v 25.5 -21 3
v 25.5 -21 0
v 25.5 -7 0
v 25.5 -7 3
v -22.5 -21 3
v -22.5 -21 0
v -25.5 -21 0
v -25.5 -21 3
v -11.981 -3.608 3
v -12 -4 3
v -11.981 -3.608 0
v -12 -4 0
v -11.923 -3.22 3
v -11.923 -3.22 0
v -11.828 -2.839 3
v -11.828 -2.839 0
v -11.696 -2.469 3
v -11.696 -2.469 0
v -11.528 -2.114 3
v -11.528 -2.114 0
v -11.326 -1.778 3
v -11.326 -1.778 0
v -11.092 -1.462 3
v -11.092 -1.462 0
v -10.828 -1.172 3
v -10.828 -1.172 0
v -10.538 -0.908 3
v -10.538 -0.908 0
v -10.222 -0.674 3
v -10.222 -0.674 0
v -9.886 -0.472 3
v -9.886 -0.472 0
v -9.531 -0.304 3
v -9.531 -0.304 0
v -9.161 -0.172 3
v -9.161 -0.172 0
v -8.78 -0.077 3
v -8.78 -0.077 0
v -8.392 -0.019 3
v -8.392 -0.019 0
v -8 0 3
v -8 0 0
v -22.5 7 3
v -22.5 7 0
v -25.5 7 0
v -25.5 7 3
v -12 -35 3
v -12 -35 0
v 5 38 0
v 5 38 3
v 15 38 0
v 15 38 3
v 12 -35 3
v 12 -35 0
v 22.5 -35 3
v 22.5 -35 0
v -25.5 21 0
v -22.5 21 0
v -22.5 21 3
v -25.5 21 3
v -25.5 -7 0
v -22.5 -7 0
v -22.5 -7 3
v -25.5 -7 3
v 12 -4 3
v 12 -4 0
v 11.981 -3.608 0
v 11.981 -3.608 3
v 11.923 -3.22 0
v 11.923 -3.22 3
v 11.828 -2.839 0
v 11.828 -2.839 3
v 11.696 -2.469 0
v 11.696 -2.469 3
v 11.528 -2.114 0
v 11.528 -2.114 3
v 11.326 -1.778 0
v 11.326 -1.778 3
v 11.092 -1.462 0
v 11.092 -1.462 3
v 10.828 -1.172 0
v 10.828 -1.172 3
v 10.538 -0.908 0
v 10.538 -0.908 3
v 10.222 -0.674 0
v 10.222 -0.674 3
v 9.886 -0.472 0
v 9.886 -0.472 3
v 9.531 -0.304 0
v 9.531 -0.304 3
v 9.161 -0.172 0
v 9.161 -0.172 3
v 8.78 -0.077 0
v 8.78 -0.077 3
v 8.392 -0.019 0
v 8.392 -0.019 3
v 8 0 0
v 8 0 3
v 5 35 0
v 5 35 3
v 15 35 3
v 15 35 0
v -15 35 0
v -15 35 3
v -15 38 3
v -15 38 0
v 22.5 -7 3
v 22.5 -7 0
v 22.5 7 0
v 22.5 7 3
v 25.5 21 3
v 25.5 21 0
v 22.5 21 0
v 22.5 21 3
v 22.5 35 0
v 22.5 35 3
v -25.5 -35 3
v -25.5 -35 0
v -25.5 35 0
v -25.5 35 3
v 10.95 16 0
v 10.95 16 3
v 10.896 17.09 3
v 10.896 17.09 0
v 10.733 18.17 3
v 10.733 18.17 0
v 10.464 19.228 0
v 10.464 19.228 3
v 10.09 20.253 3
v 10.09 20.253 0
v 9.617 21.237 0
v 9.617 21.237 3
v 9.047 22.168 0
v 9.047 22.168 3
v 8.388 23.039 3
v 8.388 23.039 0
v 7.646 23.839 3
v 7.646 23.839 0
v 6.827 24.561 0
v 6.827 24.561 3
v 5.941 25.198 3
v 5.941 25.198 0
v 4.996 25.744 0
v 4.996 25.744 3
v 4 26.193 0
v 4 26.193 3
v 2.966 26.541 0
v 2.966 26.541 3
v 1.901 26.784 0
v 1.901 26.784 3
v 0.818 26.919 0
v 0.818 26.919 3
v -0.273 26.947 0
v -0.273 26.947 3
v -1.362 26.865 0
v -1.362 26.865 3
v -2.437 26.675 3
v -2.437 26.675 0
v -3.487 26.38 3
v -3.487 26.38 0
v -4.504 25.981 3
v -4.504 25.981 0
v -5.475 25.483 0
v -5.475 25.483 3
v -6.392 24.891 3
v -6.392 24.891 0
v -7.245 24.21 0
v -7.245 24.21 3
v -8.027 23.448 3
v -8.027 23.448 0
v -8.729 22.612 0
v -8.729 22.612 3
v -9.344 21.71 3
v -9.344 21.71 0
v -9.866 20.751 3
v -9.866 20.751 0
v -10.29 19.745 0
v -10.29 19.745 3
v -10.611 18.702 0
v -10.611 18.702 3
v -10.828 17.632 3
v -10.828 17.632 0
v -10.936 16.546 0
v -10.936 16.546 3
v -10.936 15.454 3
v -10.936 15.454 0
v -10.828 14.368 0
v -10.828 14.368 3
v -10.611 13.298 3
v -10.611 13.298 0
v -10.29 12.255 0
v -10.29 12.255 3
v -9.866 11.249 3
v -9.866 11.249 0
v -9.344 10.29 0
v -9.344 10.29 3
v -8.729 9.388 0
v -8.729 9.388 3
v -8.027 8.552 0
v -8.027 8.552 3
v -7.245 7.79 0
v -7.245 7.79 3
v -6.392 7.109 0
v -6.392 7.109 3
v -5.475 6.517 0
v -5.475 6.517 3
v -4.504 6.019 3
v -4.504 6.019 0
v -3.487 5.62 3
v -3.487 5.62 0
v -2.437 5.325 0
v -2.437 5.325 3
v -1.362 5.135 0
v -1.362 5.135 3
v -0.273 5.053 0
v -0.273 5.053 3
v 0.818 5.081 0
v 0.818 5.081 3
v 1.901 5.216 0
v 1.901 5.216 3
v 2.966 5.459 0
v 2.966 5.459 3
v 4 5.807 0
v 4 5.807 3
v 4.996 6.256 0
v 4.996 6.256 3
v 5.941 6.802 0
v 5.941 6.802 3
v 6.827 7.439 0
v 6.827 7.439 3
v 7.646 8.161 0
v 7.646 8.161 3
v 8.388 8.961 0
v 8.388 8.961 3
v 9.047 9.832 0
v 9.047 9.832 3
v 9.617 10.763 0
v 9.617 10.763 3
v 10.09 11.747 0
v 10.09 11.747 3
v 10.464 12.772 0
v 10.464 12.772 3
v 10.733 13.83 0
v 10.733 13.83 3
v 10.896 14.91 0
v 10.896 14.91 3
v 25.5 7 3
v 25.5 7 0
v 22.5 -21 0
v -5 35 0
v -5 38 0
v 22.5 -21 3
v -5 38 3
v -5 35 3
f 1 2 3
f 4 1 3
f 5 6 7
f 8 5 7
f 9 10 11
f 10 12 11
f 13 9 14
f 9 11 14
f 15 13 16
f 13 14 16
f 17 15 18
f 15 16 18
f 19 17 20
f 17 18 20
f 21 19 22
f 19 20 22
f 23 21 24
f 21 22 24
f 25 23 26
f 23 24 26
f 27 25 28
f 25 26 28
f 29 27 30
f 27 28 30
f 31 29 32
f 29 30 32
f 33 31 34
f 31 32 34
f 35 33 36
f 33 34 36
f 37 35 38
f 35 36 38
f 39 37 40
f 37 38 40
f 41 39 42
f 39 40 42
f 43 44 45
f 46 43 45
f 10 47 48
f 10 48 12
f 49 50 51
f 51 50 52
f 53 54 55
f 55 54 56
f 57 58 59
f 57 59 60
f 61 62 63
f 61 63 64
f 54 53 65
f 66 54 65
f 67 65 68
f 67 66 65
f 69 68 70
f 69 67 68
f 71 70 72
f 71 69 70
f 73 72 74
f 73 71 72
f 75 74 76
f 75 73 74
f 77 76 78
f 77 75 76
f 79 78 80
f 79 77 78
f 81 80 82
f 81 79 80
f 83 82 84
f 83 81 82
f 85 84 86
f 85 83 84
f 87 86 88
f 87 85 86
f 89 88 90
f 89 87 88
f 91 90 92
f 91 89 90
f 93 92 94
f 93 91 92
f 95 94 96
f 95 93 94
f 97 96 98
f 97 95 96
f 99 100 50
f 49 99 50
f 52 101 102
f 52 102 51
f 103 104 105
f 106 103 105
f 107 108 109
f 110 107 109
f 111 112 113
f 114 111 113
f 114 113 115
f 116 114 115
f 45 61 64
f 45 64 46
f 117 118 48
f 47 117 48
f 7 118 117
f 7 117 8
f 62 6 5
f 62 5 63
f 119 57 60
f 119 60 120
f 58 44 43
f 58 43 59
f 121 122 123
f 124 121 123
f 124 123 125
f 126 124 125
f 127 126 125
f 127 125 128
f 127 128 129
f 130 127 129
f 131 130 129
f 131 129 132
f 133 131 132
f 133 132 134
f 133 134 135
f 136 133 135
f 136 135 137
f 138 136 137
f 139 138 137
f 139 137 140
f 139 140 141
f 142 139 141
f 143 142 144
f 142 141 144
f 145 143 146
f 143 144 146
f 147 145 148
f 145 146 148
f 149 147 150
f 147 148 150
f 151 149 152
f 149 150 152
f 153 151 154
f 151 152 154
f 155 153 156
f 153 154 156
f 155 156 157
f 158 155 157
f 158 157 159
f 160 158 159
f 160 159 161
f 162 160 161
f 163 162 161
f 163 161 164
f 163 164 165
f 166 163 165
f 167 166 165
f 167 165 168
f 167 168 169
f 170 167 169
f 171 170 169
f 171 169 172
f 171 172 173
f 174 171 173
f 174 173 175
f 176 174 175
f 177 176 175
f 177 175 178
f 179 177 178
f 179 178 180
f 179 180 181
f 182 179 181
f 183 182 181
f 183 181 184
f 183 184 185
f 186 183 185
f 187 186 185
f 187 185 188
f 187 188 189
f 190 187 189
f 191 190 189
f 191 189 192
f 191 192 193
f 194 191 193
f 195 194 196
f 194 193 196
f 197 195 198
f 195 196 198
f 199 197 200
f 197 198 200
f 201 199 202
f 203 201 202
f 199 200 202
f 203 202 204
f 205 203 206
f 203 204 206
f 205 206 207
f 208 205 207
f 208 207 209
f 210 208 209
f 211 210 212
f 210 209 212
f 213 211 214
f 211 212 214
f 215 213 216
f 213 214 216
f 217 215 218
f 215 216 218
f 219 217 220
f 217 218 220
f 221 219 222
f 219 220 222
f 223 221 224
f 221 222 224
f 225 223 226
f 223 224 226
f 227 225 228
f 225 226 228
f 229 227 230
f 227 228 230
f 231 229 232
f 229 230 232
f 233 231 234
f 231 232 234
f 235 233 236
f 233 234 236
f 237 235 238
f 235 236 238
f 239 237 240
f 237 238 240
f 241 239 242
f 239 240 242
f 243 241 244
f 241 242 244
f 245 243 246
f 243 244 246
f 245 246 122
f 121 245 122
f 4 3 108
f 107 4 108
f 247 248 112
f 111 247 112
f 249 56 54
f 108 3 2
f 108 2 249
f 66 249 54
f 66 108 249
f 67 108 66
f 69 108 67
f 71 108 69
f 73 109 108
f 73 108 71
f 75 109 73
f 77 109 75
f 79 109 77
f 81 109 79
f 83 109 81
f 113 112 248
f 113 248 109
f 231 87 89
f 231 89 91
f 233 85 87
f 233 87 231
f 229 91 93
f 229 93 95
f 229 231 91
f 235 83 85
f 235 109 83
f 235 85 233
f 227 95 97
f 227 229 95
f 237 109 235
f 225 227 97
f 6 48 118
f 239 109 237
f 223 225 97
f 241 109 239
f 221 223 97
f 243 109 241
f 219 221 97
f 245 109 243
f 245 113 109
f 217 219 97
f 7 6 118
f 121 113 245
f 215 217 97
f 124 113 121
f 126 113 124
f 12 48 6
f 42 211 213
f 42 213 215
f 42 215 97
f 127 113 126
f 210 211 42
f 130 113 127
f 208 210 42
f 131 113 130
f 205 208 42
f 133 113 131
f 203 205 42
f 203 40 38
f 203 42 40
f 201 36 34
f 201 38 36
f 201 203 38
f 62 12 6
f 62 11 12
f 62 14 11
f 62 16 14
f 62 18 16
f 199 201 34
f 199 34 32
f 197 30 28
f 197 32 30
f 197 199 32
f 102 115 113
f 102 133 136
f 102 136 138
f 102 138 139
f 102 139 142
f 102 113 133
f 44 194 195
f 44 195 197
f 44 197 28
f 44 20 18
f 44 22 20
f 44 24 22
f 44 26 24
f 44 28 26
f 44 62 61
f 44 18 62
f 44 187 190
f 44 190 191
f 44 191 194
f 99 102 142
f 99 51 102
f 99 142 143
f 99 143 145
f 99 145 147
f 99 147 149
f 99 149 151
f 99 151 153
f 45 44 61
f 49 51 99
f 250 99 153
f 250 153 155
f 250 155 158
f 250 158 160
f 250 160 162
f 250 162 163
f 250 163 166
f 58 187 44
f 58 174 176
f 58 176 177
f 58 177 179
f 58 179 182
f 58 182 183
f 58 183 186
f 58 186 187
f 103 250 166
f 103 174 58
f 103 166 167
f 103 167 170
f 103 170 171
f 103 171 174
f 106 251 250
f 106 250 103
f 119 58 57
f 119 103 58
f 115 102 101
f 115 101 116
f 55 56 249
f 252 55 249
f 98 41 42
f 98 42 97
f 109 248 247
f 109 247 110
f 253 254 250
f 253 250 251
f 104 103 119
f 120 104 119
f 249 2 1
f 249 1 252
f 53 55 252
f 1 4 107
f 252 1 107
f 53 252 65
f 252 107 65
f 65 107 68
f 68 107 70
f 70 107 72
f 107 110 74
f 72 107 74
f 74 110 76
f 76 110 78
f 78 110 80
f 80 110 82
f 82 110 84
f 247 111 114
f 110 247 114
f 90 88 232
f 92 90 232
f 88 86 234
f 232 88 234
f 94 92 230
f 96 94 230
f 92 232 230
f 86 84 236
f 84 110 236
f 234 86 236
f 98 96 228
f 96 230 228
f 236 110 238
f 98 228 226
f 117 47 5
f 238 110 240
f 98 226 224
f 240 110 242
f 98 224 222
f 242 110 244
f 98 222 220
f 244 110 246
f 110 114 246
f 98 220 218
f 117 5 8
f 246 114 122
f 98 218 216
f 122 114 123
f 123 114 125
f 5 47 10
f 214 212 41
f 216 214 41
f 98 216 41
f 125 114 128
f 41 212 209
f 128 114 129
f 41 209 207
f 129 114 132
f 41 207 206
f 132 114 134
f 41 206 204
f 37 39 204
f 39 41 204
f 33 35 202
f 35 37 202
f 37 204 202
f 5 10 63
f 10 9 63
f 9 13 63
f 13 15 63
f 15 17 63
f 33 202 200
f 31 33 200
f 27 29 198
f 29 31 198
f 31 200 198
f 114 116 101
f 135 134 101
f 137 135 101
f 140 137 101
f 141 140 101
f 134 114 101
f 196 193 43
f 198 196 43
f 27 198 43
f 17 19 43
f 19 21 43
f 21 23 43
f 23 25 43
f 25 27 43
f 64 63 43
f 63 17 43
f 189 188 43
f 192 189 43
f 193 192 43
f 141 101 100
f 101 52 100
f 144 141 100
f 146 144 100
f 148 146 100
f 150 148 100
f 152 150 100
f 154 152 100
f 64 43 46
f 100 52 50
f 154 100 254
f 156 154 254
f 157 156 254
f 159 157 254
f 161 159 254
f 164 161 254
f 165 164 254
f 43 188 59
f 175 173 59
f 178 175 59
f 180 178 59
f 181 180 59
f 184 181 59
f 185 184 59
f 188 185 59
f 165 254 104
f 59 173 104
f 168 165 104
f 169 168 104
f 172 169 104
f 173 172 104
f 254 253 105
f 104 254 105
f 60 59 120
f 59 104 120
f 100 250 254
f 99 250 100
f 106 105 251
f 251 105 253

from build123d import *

# Parameters (mm, degrees)
SKETCH1_W           = 45
SKETCH1_H           = 70
BOSS_EXTRUDE1_DEPTH = 3
SKETCH2_R           = 10.95
SKETCH2_W           = 24
SKETCH2_H           = 35
CUT_EXTRUDE1_DEPTH  = 4
FILLET1_R           = 4
SKETCH4_W           = 10
SKETCH4_H           = 3
BOSS_EXTRUDE3_DEPTH = 3
SKETCH3_W           = 3
SKETCH3_H           = 14
BOSS_EXTRUDE2_DEPTH = 3


with BuildPart() as part:
    # Sketch1 → Boss-Extrude1 (new body)
    with BuildSketch(Plane.XY):
        Rectangle(SKETCH1_W, SKETCH1_H)
    extrude(amount=BOSS_EXTRUDE1_DEPTH)

    # Sketch2 → Cut-Extrude1 (cut, through all)
    with BuildSketch(Plane.XY.offset(3)):
        with Locations((0, 16)):
            Circle(SKETCH2_R)
        with Locations((0, -17.5)):
            Rectangle(SKETCH2_W, SKETCH2_H)
    extrude(amount=-CUT_EXTRUDE1_DEPTH, mode=Mode.SUBTRACT)

    # Fillet1
    fillet1_edges = [part.edges().sort_by_distance(p)[0] for p in [
        (12, 0, 1.5),
        (-12, 0, 1.5),
    ]]
    fillet(fillet1_edges, radius=FILLET1_R)

    # Sketch4 → Boss-Extrude3 (add)
    with BuildSketch(Plane.XY.offset(3)):
        with Locations((-10, 36.5)):
            Rectangle(SKETCH4_W, SKETCH4_H)
        with Locations((10, 36.5)):
            Rectangle(SKETCH4_W, SKETCH4_H)
    extrude(amount=-BOSS_EXTRUDE3_DEPTH)

    # Sketch3 → Boss-Extrude2 (add)
    with BuildSketch(Plane(origin=(0, 0, 0), x_dir=(-1, 0, 0), z_dir=(0, 0, -1))):
        with Locations((24, 0)):
            Rectangle(SKETCH3_W, SKETCH3_H)
        with Locations((24, 28)):
            Rectangle(SKETCH3_W, SKETCH3_H)
        with Locations((24, -28)):
            Rectangle(SKETCH3_W, SKETCH3_H)
        with Locations((-24, 14)):
            Rectangle(SKETCH3_W, SKETCH3_H)
        with Locations((-24, -14)):
            Rectangle(SKETCH3_W, SKETCH3_H)
    extrude(amount=-BOSS_EXTRUDE2_DEPTH)


solid = part.part
